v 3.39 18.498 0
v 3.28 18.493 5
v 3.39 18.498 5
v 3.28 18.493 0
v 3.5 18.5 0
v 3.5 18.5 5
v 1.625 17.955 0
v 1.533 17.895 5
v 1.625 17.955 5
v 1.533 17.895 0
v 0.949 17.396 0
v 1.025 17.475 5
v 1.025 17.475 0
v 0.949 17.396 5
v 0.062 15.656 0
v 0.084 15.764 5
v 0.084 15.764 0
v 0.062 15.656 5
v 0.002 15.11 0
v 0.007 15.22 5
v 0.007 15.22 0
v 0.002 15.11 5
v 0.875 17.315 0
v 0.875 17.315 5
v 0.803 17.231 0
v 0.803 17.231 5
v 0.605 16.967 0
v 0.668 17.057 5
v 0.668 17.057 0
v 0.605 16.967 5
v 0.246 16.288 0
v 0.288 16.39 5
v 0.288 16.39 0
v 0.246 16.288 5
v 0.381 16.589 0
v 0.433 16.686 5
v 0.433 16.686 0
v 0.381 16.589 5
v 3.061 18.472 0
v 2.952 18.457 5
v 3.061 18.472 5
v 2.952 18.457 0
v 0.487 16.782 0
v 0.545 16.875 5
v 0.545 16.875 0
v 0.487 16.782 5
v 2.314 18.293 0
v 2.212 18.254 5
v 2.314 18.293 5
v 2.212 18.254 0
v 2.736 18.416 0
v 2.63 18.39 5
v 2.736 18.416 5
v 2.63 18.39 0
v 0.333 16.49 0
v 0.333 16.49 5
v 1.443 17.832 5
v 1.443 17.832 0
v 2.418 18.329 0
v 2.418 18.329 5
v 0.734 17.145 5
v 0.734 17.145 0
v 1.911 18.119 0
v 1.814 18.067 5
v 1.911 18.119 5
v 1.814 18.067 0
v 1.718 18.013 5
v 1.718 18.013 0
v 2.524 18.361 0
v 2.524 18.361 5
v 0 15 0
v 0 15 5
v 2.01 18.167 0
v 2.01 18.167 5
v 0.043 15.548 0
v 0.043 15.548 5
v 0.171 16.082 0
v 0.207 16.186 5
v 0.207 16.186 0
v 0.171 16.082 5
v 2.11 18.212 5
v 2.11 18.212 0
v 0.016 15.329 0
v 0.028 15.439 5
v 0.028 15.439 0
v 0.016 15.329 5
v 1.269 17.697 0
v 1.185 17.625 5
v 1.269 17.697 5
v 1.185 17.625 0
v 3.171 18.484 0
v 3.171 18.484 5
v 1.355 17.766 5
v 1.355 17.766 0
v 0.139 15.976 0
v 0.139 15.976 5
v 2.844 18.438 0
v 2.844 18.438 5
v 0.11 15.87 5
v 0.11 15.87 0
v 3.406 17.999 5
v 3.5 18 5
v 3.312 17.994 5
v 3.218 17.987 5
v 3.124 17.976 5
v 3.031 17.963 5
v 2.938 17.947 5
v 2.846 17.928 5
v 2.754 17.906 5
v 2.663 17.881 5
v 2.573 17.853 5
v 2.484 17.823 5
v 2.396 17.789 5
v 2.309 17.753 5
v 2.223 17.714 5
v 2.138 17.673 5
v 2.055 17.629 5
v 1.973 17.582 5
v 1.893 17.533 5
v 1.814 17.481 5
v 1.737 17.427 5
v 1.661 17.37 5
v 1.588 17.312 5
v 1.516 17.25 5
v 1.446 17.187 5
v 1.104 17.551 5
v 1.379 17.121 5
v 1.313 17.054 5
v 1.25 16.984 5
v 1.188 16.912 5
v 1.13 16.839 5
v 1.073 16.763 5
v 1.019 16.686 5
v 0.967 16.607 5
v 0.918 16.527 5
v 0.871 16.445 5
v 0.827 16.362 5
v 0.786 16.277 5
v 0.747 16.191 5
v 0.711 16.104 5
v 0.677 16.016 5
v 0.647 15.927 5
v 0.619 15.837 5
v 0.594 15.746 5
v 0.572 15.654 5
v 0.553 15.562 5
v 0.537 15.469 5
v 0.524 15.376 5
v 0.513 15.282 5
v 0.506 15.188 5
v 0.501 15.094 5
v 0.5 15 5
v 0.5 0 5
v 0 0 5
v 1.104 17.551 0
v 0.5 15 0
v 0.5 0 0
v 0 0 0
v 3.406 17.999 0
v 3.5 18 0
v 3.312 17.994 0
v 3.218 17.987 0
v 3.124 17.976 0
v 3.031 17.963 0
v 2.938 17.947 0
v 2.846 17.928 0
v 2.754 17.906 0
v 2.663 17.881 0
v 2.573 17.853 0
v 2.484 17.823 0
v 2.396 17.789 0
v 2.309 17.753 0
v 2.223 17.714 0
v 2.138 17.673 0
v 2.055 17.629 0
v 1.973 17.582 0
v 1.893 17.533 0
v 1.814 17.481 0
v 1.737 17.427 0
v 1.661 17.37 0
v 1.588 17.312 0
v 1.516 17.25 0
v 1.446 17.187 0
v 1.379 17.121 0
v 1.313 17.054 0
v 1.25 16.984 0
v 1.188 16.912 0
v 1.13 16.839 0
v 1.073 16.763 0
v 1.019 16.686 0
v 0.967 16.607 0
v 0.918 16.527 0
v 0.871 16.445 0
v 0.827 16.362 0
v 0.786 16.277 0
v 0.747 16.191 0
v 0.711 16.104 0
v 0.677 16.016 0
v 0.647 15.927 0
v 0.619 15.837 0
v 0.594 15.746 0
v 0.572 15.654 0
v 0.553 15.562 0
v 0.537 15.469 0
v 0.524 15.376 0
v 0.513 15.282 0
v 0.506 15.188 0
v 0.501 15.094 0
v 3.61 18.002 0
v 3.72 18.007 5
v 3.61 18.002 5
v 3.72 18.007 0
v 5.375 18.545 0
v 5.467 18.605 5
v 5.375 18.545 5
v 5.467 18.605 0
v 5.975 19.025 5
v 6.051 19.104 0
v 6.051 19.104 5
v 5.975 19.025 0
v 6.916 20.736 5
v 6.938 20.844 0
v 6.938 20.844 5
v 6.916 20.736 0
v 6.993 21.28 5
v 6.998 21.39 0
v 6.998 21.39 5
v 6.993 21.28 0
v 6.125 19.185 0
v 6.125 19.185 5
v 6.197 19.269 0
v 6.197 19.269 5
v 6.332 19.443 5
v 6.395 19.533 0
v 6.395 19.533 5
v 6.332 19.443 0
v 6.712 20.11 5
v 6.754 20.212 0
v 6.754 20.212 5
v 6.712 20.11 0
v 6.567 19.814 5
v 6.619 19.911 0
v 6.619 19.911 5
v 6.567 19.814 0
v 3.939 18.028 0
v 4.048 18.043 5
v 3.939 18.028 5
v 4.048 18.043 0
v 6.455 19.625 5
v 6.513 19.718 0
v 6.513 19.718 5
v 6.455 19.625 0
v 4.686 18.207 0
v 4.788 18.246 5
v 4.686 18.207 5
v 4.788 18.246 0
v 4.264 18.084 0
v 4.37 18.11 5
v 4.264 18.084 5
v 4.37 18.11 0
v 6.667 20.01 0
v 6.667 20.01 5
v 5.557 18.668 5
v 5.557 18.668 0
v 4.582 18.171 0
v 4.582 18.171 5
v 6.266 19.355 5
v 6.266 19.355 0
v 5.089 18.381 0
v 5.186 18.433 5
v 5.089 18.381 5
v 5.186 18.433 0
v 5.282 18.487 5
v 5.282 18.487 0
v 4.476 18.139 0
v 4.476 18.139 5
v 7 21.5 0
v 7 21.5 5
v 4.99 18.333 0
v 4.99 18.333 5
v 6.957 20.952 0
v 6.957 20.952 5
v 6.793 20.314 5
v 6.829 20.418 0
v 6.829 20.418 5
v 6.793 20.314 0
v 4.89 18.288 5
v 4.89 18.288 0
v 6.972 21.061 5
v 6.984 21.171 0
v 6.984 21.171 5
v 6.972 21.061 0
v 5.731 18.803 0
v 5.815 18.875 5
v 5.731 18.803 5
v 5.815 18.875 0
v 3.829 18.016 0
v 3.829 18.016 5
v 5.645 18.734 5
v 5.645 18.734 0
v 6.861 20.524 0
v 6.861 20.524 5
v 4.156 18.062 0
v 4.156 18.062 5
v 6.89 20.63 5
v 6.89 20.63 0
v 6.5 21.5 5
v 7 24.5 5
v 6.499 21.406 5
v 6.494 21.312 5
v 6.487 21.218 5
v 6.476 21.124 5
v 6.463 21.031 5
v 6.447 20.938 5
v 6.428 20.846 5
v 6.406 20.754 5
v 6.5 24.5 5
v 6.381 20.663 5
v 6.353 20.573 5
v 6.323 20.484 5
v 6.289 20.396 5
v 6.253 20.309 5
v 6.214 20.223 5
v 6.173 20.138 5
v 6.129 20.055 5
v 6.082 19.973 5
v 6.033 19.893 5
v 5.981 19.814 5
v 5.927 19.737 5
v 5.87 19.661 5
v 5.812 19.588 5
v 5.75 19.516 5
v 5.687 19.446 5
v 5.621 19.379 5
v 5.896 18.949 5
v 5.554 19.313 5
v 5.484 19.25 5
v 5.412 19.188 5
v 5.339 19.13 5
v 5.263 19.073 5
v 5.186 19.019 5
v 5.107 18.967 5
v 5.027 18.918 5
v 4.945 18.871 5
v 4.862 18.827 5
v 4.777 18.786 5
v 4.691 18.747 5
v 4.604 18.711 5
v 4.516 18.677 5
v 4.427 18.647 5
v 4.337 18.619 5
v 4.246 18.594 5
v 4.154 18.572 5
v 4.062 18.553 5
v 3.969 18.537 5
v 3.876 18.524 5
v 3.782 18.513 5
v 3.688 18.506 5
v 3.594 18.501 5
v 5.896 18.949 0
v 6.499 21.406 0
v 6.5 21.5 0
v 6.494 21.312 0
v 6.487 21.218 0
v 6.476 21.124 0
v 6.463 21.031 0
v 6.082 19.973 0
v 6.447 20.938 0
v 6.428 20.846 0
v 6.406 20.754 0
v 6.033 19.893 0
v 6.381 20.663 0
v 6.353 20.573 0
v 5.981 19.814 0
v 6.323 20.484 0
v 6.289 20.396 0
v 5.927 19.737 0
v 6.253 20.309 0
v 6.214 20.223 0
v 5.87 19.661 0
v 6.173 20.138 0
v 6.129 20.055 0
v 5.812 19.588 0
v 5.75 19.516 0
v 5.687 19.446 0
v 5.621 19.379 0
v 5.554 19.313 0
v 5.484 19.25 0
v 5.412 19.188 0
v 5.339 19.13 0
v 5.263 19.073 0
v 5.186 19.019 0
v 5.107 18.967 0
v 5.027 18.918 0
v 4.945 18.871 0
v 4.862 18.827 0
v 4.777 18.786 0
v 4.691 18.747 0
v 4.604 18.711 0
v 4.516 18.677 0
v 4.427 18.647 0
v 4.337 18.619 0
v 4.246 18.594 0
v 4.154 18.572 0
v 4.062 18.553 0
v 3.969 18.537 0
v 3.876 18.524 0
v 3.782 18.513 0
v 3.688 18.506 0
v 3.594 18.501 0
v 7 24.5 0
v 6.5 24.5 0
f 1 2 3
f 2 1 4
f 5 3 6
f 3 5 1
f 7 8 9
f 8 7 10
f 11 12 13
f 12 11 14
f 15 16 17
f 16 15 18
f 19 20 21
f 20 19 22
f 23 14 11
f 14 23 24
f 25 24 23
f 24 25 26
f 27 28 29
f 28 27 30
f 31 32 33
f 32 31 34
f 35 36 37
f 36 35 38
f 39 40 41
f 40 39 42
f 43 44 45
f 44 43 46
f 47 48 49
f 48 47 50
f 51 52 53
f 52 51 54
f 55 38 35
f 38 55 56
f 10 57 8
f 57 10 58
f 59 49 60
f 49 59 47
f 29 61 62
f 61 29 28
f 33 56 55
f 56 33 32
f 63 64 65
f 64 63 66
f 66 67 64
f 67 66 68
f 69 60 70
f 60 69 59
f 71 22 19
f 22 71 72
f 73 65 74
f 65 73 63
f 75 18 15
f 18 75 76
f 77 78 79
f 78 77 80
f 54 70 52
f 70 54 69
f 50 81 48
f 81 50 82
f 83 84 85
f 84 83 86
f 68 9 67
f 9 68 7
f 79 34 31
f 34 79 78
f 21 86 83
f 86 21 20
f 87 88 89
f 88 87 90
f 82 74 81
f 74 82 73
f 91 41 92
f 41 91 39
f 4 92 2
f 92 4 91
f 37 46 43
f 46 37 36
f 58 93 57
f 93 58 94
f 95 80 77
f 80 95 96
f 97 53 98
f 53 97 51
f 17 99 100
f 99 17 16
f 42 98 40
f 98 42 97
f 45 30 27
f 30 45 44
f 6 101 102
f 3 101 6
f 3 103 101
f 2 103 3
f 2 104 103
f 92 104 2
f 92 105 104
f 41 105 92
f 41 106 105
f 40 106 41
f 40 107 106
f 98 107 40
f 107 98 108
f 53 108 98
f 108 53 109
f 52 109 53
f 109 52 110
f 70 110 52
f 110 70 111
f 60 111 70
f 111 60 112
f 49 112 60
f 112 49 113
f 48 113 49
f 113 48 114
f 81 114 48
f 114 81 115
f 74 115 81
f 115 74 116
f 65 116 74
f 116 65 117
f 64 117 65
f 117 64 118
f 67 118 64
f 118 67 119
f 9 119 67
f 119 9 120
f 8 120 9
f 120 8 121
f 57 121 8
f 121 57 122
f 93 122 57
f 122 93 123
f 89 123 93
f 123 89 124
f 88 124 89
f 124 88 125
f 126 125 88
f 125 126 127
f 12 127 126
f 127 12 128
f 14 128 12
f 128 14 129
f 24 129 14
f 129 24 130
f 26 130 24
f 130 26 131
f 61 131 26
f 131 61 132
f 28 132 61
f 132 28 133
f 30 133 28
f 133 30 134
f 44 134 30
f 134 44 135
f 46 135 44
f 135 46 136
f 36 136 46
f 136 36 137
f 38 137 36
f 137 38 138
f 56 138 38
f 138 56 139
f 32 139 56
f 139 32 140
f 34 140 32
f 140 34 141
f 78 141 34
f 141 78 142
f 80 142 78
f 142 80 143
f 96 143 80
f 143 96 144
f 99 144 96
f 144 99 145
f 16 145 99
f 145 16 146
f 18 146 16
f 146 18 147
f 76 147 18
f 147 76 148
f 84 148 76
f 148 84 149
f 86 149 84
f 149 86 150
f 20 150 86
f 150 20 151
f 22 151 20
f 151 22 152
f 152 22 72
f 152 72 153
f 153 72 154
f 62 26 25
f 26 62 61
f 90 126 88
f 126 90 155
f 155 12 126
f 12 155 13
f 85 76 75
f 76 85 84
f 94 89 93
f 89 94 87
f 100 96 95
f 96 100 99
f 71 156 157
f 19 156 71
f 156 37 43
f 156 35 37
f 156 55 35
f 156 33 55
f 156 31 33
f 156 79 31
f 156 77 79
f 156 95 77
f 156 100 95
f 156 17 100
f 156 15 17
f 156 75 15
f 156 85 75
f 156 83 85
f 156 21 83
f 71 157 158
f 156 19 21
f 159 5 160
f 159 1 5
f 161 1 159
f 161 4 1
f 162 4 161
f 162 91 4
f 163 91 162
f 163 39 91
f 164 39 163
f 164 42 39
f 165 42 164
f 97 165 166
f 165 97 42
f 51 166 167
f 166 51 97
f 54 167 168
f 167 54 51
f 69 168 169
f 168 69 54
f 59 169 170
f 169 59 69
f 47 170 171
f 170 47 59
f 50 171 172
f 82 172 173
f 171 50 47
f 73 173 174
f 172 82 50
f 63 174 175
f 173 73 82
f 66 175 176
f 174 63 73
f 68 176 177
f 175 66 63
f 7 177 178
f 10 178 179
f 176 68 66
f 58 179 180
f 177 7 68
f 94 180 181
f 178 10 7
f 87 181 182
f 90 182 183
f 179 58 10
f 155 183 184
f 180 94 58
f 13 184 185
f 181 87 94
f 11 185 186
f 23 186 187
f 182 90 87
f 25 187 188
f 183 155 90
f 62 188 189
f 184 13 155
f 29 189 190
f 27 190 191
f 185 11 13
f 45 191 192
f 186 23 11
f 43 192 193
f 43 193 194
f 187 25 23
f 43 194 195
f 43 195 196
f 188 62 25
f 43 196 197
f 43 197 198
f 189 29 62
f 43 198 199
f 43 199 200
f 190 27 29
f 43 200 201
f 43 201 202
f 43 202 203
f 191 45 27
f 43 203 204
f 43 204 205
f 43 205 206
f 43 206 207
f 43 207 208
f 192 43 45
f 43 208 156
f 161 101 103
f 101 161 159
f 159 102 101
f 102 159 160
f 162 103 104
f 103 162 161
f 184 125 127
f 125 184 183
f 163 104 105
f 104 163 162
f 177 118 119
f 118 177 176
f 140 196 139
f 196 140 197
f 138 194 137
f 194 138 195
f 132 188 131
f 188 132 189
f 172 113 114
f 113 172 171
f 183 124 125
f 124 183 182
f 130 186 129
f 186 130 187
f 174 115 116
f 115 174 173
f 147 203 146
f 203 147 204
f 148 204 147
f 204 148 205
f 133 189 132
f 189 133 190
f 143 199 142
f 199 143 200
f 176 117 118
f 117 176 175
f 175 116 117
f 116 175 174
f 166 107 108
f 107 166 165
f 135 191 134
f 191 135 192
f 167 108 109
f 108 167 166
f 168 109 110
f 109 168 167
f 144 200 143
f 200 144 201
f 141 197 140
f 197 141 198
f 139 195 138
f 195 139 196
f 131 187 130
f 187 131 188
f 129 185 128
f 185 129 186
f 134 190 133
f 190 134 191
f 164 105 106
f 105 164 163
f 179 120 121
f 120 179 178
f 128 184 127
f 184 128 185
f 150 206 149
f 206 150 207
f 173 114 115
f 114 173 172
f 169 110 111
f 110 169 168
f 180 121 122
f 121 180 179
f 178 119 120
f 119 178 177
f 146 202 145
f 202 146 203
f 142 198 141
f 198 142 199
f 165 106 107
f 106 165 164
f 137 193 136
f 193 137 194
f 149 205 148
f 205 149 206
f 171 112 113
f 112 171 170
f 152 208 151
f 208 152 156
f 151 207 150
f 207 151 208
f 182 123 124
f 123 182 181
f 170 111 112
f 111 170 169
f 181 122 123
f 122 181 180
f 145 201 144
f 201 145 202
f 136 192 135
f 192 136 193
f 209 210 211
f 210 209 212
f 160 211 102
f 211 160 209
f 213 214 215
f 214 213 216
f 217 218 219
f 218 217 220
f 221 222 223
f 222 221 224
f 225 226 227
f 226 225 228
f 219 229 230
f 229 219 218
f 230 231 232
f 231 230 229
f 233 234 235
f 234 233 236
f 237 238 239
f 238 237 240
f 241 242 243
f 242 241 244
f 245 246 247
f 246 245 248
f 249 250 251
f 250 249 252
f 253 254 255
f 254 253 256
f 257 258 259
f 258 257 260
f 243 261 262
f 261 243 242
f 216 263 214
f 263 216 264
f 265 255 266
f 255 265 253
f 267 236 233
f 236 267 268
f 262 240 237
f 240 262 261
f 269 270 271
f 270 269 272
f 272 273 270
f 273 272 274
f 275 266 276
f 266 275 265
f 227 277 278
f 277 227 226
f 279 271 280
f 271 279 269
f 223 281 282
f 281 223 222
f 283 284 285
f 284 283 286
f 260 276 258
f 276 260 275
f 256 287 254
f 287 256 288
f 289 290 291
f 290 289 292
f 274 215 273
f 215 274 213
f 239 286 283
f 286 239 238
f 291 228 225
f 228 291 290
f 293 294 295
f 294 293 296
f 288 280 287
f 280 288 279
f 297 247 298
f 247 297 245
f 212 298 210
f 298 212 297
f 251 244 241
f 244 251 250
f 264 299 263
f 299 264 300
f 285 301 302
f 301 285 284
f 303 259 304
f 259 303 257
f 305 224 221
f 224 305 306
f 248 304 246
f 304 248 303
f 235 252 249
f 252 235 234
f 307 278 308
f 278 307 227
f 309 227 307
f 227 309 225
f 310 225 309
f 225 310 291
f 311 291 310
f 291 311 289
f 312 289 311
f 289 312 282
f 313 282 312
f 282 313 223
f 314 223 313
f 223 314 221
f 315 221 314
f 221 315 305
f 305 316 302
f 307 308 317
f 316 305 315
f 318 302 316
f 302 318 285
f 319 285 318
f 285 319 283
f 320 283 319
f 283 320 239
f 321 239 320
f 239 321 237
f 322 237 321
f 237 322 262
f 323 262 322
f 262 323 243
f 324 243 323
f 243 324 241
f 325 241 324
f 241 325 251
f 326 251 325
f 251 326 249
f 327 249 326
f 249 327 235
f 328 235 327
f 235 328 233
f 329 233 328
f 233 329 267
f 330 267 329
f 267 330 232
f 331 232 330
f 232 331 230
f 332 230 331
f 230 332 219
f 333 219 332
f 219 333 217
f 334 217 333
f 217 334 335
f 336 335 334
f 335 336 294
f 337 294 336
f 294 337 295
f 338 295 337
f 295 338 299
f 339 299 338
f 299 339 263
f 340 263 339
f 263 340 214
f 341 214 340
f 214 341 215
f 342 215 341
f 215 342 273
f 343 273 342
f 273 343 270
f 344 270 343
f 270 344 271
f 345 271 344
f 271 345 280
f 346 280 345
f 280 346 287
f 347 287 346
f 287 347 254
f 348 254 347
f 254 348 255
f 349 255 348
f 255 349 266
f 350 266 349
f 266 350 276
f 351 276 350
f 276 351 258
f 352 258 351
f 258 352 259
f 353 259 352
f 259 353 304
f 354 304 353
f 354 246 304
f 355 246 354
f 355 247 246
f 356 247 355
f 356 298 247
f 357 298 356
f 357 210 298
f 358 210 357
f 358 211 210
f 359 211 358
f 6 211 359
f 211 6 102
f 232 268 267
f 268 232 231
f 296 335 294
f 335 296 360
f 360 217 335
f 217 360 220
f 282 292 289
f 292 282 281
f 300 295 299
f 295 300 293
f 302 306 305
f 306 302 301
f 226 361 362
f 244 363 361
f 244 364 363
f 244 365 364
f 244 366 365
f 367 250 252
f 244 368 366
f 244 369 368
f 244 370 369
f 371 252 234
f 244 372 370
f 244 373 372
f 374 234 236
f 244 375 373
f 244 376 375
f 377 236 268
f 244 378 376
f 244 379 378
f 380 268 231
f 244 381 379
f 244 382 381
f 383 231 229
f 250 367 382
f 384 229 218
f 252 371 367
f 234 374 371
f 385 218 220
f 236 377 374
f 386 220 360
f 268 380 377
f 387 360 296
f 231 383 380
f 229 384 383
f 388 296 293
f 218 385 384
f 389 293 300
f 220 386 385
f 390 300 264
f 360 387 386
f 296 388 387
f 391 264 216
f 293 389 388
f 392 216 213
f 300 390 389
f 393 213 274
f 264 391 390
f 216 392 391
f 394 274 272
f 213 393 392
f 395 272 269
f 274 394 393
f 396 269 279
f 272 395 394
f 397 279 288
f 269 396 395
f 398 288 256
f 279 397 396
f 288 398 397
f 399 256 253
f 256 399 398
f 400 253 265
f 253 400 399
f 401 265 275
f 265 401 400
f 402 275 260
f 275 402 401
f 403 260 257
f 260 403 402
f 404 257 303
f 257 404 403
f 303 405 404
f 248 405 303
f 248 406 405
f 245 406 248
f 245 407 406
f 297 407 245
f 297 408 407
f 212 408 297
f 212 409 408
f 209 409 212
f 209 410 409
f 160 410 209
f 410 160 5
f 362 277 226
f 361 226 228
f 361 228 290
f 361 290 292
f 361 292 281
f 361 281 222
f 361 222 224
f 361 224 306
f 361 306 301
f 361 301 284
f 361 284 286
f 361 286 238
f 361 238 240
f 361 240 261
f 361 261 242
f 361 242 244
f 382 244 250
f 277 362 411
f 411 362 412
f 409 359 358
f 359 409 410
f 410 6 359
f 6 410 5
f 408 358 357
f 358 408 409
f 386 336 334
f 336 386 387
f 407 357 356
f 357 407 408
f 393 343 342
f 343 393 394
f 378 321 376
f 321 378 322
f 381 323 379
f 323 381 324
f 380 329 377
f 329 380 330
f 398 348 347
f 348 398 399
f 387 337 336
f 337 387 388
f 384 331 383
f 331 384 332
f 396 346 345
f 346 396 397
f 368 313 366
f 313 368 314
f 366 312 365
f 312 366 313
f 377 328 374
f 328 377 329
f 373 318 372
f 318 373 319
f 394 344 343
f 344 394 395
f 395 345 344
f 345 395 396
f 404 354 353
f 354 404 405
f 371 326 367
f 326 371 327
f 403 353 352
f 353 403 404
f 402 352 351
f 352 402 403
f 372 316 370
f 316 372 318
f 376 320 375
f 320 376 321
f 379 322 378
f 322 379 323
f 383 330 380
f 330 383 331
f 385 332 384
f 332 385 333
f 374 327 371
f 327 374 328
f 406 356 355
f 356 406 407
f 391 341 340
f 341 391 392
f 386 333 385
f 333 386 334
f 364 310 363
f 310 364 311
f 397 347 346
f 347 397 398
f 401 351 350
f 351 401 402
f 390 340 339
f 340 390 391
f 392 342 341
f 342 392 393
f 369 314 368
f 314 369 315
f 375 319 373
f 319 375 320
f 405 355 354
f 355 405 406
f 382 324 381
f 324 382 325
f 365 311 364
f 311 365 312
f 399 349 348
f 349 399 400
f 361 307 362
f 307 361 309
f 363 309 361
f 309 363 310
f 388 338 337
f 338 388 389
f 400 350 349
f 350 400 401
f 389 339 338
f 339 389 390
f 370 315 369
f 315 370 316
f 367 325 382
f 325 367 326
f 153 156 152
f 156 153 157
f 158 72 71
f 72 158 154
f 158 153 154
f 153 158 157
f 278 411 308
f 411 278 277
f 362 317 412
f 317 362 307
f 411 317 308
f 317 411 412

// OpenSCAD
//=============================================================================
// baseboard-cable-clip.scad
//
// A simple clip for running cables along the top of a baseboard.
//=============================================================================
// Written in 2017 by Patrick Barrett
//
// To the extent possible under law, the author(s) have dedicated all copyright
// and related and neighboring rights to this work to the public domain
// worldwide. This work is distributed without any warranty.
//
// See <http://creativecommons.org/publicdomain/zero/1.0/> for full dedication.
//=============================================================================

wall = 0.5;
width = 5;
depth = 15;
cabled =  6;

// customizable variables end here

abit = 0.001; //use for making overlap to get single manifold stl
alot = 50;

$fn = 200;

module quarter_arc(d, h, w) {
    difference(){
        cylinder(d=d+2*w, h=h);
        translate([0,0,-alot/2])
        cylinder(d=d, h=alot);
        translate([-alot,-alot/2,-alot/2])
        cube([alot,alot,alot]);
        translate([-alot/2,-alot,-alot/2])
        cube([alot,alot,alot]);
    }
}

// main body
union() {
    cube([wall, depth, width]);
    
    translate([cabled/2 + wall,depth,0])
    rotate([0,0,90])
    quarter_arc(cabled, width, wall);
    
    translate([cabled/2 + wall, cabled + wall + depth,0])
    rotate([0,0,-90])
    quarter_arc(cabled, width, wall);
    
    translate([cabled + wall,depth+cabled+wall,0])
    cube([wall, cabled/2, width]);
}
